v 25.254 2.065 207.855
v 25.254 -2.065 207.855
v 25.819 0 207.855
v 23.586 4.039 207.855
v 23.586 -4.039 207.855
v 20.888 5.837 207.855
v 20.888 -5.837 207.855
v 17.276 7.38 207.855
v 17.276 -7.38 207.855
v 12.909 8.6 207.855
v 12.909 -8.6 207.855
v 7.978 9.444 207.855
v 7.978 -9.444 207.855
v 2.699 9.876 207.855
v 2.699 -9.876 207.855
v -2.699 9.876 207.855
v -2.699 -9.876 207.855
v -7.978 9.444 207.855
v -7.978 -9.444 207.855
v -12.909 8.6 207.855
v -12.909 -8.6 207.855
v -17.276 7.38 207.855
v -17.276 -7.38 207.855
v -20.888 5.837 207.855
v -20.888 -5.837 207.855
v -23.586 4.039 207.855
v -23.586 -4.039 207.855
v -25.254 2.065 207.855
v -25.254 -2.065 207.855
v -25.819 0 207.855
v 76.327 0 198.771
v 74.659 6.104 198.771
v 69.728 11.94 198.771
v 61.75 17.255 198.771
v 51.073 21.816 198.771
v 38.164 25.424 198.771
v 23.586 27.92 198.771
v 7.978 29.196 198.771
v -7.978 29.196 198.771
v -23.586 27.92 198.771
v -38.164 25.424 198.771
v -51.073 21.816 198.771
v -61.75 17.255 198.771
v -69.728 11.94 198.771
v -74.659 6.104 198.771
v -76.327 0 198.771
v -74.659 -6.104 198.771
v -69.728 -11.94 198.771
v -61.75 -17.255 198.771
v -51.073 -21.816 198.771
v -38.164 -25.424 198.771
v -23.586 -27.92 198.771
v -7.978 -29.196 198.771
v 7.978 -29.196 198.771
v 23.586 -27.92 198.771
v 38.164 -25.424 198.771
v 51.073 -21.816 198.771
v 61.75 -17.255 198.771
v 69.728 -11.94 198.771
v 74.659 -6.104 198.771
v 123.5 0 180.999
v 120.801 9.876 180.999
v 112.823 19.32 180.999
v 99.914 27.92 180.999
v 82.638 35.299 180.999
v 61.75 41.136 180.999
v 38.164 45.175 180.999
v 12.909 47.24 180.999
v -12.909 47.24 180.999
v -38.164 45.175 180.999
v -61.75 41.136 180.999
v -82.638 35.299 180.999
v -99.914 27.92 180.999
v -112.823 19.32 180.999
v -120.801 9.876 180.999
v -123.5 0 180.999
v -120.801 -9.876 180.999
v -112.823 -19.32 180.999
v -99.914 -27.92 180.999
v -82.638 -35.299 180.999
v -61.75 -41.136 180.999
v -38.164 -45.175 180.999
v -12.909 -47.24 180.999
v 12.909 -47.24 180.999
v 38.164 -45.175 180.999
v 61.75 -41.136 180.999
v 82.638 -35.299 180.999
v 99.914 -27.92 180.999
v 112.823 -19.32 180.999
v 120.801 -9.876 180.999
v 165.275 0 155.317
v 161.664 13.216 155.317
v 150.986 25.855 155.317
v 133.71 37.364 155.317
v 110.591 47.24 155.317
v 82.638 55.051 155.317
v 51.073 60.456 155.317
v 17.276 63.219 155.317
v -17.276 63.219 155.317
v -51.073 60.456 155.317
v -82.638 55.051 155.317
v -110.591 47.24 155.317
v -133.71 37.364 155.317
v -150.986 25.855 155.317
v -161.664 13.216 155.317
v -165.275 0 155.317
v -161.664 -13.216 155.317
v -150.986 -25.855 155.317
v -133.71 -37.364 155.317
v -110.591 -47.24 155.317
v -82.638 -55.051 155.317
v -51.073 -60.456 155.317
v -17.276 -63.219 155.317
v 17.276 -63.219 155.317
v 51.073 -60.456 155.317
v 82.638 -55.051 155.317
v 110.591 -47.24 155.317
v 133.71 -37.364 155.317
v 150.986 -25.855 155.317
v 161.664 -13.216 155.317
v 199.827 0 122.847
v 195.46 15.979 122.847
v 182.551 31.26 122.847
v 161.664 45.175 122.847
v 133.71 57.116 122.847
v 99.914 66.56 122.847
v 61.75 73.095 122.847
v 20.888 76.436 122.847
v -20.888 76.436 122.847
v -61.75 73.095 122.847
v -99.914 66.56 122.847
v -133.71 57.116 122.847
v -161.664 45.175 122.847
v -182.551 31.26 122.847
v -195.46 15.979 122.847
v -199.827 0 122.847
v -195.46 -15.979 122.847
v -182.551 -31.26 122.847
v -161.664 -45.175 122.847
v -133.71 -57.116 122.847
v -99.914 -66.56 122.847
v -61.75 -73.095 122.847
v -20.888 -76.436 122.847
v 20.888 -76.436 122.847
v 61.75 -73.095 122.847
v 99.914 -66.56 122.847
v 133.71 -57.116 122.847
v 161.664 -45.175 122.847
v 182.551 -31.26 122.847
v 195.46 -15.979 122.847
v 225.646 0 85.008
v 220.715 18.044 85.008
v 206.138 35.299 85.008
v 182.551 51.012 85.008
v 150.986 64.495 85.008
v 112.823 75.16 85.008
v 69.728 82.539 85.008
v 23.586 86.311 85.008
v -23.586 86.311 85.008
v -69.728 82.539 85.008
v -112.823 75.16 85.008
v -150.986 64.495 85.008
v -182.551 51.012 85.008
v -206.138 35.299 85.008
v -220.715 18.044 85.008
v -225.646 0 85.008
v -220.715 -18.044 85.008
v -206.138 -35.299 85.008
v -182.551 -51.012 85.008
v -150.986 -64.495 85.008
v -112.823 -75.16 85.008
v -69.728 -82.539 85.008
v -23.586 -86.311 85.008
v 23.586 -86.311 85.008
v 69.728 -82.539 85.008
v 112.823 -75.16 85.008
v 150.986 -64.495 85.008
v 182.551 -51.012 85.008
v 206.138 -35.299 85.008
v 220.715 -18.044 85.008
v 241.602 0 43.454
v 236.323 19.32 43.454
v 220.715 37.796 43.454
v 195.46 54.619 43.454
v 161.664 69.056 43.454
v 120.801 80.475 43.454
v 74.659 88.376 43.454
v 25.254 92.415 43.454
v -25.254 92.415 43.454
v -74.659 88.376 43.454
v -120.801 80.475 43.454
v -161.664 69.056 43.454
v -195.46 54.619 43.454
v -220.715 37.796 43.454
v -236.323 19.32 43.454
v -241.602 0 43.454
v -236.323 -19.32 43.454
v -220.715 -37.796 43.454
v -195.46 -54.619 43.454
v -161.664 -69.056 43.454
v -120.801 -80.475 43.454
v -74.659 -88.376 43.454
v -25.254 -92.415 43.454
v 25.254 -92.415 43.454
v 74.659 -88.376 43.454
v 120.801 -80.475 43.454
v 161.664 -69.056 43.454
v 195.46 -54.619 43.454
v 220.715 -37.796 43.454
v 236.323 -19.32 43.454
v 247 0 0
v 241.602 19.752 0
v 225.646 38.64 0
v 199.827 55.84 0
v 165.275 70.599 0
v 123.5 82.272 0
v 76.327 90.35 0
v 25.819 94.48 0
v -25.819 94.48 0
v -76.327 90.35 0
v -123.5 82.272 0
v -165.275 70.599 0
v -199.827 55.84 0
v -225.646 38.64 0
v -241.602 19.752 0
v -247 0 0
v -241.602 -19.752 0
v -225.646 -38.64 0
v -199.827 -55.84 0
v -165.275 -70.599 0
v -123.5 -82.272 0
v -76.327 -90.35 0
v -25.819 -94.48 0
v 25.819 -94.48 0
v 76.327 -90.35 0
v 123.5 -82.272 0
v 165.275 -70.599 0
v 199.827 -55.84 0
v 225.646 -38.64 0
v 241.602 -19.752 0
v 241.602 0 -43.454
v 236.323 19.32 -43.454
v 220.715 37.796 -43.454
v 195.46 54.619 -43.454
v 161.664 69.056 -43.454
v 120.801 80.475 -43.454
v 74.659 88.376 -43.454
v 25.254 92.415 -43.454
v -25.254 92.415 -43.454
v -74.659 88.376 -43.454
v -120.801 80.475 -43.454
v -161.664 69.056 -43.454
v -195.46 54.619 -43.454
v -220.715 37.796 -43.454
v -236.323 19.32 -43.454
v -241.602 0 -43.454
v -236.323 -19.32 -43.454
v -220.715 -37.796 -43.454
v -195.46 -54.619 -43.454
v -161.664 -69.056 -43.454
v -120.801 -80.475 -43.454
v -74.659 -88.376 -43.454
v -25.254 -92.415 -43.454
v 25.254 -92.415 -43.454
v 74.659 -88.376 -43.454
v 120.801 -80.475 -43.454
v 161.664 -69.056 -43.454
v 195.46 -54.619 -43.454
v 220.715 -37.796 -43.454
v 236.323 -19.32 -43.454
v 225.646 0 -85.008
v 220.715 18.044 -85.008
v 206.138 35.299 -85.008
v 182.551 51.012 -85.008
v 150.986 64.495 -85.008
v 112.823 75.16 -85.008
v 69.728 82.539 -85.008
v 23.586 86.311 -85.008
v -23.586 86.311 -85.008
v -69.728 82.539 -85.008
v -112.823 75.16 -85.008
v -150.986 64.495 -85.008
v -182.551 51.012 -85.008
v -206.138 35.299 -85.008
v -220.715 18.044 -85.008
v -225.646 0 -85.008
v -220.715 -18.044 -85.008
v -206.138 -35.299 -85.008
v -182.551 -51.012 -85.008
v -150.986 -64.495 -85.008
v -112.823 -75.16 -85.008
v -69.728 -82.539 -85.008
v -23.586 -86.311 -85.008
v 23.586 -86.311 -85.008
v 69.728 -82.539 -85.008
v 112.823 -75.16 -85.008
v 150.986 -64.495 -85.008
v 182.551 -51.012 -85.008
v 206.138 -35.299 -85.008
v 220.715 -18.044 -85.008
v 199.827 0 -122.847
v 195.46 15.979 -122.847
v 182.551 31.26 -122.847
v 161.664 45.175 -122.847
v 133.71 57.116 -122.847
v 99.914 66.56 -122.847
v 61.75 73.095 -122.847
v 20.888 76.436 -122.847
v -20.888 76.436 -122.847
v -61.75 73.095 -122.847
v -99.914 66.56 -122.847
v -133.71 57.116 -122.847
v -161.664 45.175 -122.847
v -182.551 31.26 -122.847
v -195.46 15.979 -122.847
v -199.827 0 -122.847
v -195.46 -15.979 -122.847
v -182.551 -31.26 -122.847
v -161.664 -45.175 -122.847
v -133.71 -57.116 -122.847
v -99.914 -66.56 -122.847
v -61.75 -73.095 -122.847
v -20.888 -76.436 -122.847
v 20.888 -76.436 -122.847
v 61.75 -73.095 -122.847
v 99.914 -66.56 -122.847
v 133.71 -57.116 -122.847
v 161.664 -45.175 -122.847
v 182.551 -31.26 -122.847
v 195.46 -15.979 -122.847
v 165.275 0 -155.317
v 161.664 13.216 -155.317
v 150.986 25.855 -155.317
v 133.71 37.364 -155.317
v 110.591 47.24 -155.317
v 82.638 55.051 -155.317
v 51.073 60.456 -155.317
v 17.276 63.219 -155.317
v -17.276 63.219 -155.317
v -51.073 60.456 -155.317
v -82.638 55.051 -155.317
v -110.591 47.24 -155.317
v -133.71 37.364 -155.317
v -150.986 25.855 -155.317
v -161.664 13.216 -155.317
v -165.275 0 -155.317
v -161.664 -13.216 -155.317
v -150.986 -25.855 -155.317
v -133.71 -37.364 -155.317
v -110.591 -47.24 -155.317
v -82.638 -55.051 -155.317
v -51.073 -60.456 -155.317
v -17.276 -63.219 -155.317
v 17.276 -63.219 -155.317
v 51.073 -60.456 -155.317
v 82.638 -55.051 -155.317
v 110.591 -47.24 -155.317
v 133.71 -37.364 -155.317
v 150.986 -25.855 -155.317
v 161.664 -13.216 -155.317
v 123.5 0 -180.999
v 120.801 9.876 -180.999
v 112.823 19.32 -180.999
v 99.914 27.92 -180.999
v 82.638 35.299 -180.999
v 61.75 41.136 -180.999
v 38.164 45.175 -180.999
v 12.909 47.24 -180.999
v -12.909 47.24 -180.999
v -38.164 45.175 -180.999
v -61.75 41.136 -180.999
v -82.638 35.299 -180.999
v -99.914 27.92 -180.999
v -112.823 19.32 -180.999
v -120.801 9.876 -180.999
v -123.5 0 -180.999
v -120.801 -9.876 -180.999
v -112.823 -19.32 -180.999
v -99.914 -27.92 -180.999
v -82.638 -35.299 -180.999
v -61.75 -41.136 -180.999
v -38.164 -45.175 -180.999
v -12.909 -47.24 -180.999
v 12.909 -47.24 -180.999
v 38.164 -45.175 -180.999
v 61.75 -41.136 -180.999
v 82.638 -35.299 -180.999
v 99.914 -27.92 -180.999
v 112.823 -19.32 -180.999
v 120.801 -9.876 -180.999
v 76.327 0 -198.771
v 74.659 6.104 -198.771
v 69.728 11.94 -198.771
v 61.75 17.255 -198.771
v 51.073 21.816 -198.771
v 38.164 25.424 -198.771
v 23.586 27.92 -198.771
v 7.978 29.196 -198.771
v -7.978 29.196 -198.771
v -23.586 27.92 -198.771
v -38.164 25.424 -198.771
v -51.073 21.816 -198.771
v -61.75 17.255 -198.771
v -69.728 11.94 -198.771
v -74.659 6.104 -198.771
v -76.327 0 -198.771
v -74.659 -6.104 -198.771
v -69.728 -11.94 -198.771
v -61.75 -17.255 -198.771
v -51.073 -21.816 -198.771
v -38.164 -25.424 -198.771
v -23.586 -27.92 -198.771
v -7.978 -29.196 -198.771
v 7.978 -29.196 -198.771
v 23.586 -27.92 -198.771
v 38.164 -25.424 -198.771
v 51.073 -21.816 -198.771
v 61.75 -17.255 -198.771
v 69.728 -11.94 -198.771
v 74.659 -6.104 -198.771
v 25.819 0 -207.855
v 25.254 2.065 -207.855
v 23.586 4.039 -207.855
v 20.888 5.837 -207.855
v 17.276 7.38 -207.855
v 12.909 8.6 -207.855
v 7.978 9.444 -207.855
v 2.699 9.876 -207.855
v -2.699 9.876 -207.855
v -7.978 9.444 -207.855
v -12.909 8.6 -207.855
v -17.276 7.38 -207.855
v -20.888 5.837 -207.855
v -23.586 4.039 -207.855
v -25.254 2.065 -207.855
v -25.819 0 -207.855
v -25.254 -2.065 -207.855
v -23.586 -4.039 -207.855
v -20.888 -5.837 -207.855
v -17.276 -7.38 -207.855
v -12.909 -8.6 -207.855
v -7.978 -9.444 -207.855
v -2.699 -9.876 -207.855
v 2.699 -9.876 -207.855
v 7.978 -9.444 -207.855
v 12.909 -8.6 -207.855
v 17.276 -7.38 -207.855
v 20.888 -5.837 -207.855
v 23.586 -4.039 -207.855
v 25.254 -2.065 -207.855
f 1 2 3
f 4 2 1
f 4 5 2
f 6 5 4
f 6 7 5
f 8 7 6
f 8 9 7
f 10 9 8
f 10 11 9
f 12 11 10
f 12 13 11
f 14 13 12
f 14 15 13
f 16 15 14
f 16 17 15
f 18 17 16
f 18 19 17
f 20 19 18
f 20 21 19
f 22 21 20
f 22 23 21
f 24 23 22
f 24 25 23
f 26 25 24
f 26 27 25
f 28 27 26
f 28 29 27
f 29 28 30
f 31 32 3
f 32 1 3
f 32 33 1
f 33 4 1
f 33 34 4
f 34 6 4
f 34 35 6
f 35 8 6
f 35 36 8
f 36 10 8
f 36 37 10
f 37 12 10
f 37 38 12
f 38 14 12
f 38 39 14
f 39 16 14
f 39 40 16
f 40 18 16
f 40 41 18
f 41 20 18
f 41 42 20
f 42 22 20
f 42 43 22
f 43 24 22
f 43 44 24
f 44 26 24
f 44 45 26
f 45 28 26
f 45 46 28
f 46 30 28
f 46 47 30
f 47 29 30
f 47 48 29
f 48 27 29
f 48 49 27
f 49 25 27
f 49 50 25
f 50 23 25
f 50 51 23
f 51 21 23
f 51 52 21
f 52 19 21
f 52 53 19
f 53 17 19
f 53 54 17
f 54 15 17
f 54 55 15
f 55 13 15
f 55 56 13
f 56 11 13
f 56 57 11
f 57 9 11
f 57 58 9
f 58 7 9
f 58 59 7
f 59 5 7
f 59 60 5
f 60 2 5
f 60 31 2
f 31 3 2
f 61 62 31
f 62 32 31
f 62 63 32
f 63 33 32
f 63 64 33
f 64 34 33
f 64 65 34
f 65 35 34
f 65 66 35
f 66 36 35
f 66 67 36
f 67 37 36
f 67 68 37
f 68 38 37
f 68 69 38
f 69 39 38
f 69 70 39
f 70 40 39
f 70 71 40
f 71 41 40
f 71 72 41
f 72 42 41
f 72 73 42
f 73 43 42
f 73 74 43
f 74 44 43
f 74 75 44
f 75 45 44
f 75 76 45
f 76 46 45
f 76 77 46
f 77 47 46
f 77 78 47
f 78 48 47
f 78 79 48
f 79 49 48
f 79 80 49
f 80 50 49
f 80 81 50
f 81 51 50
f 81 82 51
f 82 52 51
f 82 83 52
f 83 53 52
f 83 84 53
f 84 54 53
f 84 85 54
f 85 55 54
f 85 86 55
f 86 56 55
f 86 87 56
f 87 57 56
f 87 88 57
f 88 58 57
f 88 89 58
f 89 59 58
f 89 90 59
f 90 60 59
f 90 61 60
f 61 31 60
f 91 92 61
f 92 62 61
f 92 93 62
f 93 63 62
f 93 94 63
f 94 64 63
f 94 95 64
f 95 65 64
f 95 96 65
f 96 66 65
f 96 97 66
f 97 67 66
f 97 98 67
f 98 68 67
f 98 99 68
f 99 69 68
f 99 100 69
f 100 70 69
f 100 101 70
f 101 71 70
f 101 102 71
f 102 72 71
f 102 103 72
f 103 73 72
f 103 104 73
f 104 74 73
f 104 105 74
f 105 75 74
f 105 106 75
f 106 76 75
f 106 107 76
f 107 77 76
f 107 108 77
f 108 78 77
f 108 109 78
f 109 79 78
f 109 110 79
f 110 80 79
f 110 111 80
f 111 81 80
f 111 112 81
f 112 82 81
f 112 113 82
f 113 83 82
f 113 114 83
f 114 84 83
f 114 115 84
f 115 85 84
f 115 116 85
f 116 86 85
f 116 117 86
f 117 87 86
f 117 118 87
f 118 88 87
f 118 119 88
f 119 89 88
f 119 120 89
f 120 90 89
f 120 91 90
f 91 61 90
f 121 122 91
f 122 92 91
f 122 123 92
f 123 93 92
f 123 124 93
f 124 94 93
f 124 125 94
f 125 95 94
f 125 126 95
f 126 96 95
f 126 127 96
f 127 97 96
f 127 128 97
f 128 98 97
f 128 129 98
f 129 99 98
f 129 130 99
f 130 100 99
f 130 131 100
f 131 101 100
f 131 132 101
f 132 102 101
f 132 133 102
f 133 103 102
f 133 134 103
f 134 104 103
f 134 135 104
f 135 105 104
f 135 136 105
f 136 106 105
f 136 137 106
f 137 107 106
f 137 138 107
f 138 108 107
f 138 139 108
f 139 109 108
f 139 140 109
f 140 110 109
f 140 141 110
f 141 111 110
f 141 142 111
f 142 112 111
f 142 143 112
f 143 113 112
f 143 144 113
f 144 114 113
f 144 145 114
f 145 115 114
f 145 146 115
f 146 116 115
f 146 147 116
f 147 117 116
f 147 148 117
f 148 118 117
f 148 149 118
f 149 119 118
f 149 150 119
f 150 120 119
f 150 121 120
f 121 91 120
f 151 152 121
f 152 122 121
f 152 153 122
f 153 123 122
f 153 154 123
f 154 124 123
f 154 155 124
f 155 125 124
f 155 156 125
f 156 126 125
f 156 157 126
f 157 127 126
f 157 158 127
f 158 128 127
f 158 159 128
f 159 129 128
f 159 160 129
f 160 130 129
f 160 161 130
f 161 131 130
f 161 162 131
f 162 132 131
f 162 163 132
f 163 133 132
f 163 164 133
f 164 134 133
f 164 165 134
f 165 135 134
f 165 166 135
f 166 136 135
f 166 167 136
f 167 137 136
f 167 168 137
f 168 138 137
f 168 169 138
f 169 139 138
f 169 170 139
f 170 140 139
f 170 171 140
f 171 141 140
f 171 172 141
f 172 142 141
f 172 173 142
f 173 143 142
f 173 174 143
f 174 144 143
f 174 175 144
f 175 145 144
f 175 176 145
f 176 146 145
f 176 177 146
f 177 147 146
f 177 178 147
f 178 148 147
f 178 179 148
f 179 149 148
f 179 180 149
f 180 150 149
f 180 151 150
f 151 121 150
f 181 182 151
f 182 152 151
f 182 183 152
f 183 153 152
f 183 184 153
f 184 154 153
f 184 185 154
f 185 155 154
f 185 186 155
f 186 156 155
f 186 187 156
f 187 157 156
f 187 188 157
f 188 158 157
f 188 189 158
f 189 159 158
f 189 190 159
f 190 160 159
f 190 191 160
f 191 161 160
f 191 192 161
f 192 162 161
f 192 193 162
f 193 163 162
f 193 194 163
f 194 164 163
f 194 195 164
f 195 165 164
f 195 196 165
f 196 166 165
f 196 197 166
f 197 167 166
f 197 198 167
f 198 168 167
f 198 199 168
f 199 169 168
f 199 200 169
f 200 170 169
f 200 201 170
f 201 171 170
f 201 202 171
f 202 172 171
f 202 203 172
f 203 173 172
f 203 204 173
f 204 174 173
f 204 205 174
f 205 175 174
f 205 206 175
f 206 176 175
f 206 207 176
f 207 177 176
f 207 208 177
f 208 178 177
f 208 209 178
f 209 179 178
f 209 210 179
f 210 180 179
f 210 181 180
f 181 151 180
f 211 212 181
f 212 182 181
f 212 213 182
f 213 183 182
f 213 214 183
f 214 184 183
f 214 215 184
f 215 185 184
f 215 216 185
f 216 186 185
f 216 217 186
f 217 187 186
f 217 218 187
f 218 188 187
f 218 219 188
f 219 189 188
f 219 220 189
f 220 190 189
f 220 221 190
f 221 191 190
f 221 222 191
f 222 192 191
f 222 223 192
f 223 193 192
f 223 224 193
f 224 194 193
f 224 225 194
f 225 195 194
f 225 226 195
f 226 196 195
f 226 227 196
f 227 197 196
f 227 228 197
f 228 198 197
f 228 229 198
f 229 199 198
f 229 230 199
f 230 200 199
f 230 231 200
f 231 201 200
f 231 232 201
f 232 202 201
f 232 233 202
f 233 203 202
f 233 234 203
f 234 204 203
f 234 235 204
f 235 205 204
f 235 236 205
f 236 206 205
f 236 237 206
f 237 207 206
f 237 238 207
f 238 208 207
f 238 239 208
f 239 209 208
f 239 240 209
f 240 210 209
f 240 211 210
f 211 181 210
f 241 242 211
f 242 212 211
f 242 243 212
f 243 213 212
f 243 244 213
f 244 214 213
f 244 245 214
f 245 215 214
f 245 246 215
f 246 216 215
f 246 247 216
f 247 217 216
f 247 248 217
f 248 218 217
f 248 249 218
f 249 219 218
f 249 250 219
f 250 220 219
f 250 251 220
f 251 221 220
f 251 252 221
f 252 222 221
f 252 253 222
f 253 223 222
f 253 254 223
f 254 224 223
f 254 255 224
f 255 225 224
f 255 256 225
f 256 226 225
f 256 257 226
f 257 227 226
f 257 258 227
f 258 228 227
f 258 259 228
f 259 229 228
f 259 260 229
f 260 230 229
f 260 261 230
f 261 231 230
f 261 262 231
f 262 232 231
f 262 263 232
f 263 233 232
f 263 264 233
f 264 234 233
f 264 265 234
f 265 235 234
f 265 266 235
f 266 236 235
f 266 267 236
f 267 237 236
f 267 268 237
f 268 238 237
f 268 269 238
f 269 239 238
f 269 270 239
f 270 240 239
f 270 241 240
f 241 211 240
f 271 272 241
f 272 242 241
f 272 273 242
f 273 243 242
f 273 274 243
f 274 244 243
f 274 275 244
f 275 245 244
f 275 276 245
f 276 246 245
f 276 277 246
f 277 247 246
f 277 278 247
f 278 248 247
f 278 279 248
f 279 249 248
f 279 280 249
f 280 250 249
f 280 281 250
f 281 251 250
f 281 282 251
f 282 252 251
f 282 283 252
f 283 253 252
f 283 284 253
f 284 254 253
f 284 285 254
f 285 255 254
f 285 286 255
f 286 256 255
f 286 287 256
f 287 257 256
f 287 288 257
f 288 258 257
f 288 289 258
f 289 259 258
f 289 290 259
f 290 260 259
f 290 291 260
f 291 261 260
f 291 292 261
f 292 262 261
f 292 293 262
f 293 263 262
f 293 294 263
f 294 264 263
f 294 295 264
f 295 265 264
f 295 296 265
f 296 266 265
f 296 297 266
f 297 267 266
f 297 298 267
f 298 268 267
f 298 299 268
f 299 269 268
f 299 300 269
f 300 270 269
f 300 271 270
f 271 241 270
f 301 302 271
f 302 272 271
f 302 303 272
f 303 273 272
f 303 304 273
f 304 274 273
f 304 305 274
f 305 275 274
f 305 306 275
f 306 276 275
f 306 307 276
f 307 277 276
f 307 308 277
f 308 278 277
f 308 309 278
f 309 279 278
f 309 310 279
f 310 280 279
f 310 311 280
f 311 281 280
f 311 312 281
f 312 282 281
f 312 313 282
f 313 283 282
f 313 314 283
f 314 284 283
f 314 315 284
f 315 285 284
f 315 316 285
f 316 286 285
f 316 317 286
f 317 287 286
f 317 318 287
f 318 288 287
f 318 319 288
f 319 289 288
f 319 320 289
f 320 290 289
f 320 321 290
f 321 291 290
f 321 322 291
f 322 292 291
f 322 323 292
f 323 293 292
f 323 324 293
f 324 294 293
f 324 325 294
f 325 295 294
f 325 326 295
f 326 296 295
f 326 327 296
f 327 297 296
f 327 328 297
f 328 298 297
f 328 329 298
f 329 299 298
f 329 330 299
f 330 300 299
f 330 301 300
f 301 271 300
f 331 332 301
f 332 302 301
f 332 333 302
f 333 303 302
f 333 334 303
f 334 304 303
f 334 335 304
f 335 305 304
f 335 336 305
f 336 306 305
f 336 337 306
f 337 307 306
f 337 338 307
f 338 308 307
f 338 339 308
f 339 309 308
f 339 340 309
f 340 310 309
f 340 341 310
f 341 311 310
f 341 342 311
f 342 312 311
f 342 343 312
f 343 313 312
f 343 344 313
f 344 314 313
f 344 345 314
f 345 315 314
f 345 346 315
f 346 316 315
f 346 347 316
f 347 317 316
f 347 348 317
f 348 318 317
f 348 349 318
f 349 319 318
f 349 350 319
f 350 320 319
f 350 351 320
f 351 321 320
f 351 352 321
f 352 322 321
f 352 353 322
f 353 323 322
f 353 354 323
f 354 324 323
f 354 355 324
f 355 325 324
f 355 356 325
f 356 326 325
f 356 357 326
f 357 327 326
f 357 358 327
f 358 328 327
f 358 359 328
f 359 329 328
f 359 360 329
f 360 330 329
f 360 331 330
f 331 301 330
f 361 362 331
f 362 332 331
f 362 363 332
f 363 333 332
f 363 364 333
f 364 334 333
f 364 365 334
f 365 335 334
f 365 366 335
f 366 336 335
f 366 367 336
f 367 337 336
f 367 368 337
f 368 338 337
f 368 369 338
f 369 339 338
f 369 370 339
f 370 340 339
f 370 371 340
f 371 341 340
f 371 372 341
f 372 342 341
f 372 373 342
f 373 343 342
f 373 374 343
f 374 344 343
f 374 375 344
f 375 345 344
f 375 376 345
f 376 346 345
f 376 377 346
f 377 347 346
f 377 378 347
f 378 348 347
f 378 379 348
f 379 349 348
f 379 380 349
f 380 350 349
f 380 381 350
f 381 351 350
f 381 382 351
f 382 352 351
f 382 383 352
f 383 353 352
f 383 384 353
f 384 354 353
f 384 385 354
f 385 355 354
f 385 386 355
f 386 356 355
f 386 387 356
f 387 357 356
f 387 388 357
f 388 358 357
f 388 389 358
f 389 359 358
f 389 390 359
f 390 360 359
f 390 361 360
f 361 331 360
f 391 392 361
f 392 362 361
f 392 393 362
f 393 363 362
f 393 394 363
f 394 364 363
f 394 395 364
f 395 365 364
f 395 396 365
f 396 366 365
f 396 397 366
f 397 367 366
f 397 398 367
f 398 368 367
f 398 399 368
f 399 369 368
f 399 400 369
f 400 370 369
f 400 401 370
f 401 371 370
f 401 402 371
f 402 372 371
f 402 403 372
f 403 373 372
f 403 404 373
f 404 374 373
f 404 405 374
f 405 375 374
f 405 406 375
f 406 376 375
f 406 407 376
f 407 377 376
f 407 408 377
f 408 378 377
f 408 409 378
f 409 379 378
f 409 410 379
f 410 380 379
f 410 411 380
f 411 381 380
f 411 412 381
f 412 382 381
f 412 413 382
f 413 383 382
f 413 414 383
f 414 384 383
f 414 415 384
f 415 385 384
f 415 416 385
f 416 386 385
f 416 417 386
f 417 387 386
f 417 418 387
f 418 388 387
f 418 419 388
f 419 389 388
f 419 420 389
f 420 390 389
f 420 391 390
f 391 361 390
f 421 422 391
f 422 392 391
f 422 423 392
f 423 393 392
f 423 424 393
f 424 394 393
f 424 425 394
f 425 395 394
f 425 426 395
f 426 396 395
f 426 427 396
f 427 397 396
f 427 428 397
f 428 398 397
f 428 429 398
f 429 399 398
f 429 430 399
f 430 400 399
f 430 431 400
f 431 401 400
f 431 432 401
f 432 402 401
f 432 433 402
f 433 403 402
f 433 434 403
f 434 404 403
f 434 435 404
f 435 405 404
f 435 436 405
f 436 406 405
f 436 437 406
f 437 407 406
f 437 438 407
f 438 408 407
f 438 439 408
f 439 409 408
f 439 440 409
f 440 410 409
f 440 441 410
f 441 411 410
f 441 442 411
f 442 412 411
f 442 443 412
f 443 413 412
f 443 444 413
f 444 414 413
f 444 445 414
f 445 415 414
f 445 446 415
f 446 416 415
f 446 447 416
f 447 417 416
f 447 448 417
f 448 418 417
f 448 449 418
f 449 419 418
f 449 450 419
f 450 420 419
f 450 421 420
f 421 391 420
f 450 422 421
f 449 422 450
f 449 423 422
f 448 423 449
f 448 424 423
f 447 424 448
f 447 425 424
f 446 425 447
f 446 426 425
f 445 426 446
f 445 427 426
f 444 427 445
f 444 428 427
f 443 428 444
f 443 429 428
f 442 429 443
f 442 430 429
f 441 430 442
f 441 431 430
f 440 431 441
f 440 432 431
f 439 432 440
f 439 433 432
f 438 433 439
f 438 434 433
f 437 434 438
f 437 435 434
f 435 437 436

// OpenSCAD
// Generated by SolidPython 1.0.1 on 2020-07-29 00:46:50


scale(v = [13, 5, 11]) {
	sphere(r = 19);
}
/***********************************************
*********      SolidPython code:      **********
************************************************
 
# import packages: SolidPython
from solid import *
from solid.utils import *
from itertools import chain, combinations, permutations


class Resize:

    def __init__(self, scad_file):
        self.scad_file = scad_file
        #self.scad_file = import_scad(scad_file)
        # cone/cylinder param:
        self.r1 = 0
        self.r2 = 0
        self.h = 0
        # rectangular prism param:
        self.w = 0
        self.l = 0
        # ellipse param:
        self.r = 0

    # import OpenScad code (file name corresponds to shape)


    # classify shape + parameters
    def assign(self, param1, param2, param3):
        if self.scad_file == 'cone.scad':
            self.r1 = param1
            self.r2 = param2
            self.h = param3
        elif self.scad_file == 'cylinder.scad':
            self.r1 = param1
            self.r2 = param2
            self.h = param3
        elif self.scad_file == 'rectangularPrism.scad':
            self.h = param1
            self.l = param2
            self.w = param3
        else:
            self.r = param1
            self.h = param2

    # resize parameters
    def iterate(self):
        x = range(3, 20, 2)
        i = 1
        if self.scad_file == 'cone.scad':
            tempList = list(permutations(x, 2))
            for temp in tempList:
                param1 = temp[0]
                param2 = temp[1]
                filepath = 'produced_scad_files/' + 'cone' + str(param1) + '_' + str(param2) + '_' + '.scad'
                scad_render_to_file(cylinder(h=param1, r1=param2, r2=0), filepath)

        elif self.scad_file == 'cylinder.scad':
            tempList = list(permutations(x, 3))
            for temp in tempList:
                param1 = temp[0]
                param2 = temp[1]
                filepath = 'produced_scad_files/' + 'cylinder' + str(param1) + '_' + str(param2) + '_' + '.scad'
                scad_render_to_file(cylinder(h=param1, r1=param2, r2=param2), filepath)

        elif self.scad_file == 'rectangularPrism.scad':
            tempList = list(permutations(x, 3))
            for temp in tempList:
                param1 = temp[0]
                param2 = temp[1]
                param3 = temp[2]
                filepath = 'produced_scad_files/' + 'rectangularPrism' + str(param1) + '_' + str(param2) + '_' + str(
                    param3) + '.scad'
                scad_render_to_file(cube(size=(param1, param2, param3)), filepath)

        elif self.scad_file == 'ellipse.scad':
            tempList = list(permutations(x, 4))
            for temp in tempList:
                param1 = temp[0]
                param2 = temp[1]
                param3 = temp[2]
                param4 = temp[3]
                filepath = 'produced_scad_files/' + 'ellipse' + str(param1) + '_' + str(param2) + '_' + str(param3) + '_' + str(param4) + '.scad'
                scad_render_to_file(scale([param1, param2, param3])(sphere(r=param4)), filepath)

    def render_to_scadfile(self):
        scad_render_to_file(scad, 'example.scad') 
 
************************************************/
